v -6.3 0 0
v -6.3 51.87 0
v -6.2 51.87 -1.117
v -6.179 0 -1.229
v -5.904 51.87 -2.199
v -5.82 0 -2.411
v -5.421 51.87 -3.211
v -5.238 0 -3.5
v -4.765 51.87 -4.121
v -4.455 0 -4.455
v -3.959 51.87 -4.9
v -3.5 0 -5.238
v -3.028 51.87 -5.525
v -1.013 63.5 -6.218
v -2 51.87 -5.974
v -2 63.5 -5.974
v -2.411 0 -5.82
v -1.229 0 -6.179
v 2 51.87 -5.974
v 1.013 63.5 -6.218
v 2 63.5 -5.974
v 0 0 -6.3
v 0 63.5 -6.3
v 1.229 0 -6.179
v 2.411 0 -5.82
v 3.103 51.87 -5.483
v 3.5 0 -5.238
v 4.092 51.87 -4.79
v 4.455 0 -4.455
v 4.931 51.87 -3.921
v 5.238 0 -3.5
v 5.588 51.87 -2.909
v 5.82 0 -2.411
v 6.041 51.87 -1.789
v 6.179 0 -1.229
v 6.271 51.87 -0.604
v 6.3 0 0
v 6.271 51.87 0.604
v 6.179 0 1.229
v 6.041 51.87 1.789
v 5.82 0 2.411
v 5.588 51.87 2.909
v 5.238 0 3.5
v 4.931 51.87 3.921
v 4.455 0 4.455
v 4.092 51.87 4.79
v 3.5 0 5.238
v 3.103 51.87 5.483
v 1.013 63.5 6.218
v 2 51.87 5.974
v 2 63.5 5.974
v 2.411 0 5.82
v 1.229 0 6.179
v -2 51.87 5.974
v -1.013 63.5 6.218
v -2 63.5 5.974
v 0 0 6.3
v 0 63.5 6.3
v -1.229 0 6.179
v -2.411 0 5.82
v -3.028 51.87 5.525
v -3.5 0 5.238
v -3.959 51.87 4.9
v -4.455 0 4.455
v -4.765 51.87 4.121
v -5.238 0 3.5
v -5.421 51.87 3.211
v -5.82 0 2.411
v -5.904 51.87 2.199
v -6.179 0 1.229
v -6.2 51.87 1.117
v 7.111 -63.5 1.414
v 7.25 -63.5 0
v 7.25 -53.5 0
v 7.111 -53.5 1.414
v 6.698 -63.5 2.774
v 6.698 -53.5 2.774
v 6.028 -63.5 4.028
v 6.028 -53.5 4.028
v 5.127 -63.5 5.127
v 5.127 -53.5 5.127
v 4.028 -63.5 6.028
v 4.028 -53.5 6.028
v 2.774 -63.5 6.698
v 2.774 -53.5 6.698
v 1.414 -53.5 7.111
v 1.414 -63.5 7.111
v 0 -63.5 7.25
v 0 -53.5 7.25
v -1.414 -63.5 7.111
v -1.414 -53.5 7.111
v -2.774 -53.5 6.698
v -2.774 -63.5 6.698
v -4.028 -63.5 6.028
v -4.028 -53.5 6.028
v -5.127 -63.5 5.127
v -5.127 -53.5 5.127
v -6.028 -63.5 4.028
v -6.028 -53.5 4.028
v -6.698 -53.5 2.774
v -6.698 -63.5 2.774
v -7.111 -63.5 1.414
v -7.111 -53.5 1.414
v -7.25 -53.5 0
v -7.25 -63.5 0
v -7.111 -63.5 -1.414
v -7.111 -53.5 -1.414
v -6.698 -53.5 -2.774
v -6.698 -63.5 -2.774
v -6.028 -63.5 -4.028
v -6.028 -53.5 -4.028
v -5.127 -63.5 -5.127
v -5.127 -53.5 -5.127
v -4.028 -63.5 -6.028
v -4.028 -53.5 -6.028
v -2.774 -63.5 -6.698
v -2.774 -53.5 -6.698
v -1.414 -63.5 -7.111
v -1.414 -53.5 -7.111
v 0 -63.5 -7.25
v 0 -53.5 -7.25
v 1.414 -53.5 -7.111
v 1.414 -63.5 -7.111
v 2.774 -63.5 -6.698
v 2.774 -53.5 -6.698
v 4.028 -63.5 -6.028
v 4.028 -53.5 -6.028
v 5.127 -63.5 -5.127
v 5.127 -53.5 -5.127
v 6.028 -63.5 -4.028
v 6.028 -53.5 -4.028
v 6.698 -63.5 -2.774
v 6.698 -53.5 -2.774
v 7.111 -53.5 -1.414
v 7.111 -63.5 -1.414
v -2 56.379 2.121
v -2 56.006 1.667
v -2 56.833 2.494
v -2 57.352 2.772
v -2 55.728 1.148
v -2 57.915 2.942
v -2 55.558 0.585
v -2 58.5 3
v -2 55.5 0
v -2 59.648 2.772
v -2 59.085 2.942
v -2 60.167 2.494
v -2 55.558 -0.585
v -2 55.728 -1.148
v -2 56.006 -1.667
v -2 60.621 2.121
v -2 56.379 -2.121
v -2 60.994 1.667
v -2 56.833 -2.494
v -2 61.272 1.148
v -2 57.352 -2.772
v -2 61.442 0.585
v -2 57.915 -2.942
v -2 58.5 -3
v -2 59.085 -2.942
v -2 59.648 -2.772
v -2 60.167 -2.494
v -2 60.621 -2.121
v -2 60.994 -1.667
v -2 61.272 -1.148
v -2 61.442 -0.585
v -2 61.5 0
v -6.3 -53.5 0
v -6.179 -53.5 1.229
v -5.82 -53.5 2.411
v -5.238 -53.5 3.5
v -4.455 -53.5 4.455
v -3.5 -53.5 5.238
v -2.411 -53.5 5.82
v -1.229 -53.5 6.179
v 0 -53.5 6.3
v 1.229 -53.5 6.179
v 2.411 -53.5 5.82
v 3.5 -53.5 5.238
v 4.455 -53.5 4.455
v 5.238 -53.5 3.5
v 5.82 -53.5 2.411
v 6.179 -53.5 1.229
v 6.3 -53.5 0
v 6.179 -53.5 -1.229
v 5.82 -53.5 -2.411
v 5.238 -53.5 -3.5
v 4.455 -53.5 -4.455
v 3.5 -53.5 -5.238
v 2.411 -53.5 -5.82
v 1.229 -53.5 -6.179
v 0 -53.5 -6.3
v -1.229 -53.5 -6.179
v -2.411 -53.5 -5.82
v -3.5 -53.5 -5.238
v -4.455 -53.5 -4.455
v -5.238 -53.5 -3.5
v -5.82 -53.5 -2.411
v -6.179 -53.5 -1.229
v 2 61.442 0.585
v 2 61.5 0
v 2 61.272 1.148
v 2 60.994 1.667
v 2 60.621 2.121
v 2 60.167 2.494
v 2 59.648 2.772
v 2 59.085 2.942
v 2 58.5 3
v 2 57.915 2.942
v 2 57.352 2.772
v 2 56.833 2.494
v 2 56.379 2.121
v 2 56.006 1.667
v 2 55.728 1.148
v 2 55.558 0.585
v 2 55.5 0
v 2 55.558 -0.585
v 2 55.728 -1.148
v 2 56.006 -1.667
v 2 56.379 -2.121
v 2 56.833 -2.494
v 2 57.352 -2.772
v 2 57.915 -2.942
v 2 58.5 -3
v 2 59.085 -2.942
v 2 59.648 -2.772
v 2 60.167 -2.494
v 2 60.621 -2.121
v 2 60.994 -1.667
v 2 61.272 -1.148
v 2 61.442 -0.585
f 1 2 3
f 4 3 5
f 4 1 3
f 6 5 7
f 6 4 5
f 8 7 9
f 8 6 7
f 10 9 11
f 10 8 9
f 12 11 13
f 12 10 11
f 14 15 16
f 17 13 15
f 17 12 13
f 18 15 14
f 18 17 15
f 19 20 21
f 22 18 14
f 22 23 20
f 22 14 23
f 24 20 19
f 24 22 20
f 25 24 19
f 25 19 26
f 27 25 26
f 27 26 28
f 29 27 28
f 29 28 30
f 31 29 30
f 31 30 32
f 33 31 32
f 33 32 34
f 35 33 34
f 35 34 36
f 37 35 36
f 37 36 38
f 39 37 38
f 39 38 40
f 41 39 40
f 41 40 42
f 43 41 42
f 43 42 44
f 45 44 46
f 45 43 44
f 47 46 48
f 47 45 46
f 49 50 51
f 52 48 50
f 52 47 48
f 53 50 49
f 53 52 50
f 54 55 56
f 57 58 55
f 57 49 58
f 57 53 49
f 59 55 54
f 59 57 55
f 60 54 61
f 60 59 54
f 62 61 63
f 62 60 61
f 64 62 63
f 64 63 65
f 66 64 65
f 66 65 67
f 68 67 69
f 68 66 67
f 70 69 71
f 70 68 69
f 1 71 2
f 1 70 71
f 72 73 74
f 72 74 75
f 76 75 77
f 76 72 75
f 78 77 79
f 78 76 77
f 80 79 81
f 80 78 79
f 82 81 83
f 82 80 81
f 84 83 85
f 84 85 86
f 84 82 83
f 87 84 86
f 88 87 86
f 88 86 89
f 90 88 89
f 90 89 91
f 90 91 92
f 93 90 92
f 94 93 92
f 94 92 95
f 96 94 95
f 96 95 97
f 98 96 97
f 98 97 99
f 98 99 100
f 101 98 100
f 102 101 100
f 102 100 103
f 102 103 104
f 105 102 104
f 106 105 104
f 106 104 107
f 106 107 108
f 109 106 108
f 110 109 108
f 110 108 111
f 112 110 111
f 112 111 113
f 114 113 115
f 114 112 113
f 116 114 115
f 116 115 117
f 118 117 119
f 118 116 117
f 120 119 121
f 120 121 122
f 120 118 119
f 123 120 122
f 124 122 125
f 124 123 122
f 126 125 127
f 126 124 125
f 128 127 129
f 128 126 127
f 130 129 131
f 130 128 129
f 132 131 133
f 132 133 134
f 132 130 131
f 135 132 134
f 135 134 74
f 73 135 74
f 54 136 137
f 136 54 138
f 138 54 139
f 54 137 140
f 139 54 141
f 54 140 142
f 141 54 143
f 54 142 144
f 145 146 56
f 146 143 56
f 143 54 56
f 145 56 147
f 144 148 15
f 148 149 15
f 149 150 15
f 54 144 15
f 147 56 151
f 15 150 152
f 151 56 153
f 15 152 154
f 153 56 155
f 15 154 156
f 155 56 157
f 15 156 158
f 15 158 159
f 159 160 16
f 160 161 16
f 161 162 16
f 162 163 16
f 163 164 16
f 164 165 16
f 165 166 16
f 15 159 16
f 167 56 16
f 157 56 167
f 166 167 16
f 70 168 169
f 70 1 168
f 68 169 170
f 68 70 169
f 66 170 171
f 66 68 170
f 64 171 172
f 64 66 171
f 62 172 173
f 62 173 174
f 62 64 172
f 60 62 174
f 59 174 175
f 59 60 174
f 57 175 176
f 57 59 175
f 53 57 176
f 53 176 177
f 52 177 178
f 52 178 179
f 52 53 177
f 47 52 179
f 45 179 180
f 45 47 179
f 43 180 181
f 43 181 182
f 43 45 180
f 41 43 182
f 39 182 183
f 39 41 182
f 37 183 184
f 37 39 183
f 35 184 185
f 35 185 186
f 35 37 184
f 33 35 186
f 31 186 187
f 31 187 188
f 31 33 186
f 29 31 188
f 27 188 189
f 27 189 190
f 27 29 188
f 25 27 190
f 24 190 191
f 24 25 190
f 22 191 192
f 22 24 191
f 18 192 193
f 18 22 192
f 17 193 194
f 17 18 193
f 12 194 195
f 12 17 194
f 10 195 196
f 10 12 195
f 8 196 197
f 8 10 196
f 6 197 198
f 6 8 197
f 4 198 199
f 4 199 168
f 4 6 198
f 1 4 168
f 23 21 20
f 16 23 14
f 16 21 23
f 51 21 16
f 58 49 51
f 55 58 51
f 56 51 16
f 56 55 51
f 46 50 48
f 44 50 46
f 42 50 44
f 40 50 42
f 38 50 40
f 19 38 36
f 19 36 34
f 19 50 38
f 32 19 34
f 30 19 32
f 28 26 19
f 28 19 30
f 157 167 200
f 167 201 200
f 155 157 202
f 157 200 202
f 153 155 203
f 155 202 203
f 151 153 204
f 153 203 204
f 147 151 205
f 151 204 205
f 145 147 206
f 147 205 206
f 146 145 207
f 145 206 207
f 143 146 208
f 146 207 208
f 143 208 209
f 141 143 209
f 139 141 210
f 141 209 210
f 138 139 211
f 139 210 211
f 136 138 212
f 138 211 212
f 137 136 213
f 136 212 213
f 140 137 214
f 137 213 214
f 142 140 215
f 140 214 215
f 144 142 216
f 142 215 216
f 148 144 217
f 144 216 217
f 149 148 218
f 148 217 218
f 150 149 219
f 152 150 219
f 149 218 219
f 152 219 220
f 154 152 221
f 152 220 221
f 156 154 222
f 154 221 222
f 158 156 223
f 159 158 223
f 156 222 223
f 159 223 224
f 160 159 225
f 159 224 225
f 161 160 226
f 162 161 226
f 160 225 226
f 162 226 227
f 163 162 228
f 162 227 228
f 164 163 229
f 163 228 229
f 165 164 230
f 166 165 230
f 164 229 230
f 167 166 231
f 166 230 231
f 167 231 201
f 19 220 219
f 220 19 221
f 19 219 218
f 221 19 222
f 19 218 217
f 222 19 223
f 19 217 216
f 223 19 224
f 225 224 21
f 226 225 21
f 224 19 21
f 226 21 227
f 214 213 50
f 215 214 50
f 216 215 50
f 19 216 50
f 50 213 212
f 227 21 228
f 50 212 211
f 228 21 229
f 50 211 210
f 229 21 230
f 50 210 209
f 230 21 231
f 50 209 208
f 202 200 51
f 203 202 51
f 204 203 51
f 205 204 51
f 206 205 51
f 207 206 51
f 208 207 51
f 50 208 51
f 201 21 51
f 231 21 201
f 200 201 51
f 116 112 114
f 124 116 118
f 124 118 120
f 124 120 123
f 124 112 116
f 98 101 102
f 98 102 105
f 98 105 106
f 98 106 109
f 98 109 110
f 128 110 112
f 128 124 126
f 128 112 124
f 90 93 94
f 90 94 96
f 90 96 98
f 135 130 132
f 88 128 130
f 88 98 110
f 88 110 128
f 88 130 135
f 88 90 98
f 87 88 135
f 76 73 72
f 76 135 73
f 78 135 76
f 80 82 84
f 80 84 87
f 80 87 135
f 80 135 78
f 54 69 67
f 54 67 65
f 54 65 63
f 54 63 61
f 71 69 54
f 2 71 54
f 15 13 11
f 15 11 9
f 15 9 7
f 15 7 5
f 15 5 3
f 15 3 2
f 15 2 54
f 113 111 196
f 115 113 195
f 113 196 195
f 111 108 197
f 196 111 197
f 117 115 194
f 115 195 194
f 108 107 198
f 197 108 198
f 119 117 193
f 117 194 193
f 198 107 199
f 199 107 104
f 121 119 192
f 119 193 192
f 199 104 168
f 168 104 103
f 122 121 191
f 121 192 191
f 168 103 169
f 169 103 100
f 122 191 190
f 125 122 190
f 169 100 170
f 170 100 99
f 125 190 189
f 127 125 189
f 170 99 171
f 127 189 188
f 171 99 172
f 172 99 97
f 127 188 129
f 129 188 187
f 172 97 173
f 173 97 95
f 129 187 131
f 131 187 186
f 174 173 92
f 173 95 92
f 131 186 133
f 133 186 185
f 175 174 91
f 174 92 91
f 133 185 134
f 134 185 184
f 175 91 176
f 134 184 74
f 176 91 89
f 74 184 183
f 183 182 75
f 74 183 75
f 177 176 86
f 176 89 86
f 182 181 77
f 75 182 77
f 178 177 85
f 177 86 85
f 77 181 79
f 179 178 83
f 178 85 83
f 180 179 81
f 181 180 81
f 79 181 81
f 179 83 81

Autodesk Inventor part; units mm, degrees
ref_plane "YZ Plane" through (0, 0, 0) normal (1, 0, 0) x (0, 1, 0)
ref_plane "XZ Plane" through (0, 0, 0) normal (0, 1, 0) x (-1, 0, 0)
ref_plane "XY Plane" through (0, 0, 0) normal (0, 0, 1) x (1, 0, 0)
sketch "Sketch1" plane through (0, 0, 0) normal (0, 1, 0) x (-1, 0, 0)
  circle A0 centre (0, 0) radius 6.3
  dimension "d0" = 12.6
extrude "Extrusion1" add sketch "Sketch1" along normal mid plane 127
sketch "Sketch2" plane through (0, 0, 0) normal (1, 0, 0) x (0, 1, 0)
  line L0 (63.5, -6.3) -> (63.5, 6.3) projected
  line L1 (-63.5, -6.3) -> (63.5, -6.3) projected
  line L2 (63.5, 6.3) -> (51.87, 6.3)
  line L3 (51.87, 6.3) -> (51.87, -6.3)
  line L4 (51.87, -6.3) -> (63.5, -6.3)
  line L5 (63.5, -6.3) -> (63.5, 6.3)
  line L6 (63.5, 0) -> (58.5, 0)
  circle A0 centre (58.5, 0) radius 3
  point P0 (0, 0)
  dimension "d3" = 11.63
  dimension "d7" = 5
  dimension "d8" = 6
sketch "Sketch3" plane through (0, 63.5, 0) normal (0, 1, 0) x (1, 0, 0)
  circle A0 centre (0, 0) radius 6.3 projected
  line L0 (2, -5.9741) -> (-2, -5.9741)
  line L1 (-2, -5.9741) -> (-2, 5.9741)
  line L2 (-2, 5.9741) -> (2, 5.9741)
  line L3 (2, 5.9741) -> (2, -5.9741)
  line L4 (2, -5.9741) -> (-2, 5.9741) construction
  line L5 (-2, -5.9741) -> (2, 5.9741) construction
  dimension "d4" = 4
extrude "Extrusion2" cut sketch "Sketch3" against normal blind 11.63 contours A0 L3 | L1 A0
extrude "Extrusion3" cut sketch "Sketch2" against normal mid plane 11.63 contours A0
sketch "Sketch4" plane through (0, -63.5, 0) normal (0, -1, 0) x (1, 0, 0)
  circle A0 centre (0, 0) radius 7.25
  dimension "d11" = 14.5
extrude "Extrusion4" add sketch "Sketch4" against normal blind 10
properties part number "SP6V1 Vastago Freno" material "Stainless Steel"
